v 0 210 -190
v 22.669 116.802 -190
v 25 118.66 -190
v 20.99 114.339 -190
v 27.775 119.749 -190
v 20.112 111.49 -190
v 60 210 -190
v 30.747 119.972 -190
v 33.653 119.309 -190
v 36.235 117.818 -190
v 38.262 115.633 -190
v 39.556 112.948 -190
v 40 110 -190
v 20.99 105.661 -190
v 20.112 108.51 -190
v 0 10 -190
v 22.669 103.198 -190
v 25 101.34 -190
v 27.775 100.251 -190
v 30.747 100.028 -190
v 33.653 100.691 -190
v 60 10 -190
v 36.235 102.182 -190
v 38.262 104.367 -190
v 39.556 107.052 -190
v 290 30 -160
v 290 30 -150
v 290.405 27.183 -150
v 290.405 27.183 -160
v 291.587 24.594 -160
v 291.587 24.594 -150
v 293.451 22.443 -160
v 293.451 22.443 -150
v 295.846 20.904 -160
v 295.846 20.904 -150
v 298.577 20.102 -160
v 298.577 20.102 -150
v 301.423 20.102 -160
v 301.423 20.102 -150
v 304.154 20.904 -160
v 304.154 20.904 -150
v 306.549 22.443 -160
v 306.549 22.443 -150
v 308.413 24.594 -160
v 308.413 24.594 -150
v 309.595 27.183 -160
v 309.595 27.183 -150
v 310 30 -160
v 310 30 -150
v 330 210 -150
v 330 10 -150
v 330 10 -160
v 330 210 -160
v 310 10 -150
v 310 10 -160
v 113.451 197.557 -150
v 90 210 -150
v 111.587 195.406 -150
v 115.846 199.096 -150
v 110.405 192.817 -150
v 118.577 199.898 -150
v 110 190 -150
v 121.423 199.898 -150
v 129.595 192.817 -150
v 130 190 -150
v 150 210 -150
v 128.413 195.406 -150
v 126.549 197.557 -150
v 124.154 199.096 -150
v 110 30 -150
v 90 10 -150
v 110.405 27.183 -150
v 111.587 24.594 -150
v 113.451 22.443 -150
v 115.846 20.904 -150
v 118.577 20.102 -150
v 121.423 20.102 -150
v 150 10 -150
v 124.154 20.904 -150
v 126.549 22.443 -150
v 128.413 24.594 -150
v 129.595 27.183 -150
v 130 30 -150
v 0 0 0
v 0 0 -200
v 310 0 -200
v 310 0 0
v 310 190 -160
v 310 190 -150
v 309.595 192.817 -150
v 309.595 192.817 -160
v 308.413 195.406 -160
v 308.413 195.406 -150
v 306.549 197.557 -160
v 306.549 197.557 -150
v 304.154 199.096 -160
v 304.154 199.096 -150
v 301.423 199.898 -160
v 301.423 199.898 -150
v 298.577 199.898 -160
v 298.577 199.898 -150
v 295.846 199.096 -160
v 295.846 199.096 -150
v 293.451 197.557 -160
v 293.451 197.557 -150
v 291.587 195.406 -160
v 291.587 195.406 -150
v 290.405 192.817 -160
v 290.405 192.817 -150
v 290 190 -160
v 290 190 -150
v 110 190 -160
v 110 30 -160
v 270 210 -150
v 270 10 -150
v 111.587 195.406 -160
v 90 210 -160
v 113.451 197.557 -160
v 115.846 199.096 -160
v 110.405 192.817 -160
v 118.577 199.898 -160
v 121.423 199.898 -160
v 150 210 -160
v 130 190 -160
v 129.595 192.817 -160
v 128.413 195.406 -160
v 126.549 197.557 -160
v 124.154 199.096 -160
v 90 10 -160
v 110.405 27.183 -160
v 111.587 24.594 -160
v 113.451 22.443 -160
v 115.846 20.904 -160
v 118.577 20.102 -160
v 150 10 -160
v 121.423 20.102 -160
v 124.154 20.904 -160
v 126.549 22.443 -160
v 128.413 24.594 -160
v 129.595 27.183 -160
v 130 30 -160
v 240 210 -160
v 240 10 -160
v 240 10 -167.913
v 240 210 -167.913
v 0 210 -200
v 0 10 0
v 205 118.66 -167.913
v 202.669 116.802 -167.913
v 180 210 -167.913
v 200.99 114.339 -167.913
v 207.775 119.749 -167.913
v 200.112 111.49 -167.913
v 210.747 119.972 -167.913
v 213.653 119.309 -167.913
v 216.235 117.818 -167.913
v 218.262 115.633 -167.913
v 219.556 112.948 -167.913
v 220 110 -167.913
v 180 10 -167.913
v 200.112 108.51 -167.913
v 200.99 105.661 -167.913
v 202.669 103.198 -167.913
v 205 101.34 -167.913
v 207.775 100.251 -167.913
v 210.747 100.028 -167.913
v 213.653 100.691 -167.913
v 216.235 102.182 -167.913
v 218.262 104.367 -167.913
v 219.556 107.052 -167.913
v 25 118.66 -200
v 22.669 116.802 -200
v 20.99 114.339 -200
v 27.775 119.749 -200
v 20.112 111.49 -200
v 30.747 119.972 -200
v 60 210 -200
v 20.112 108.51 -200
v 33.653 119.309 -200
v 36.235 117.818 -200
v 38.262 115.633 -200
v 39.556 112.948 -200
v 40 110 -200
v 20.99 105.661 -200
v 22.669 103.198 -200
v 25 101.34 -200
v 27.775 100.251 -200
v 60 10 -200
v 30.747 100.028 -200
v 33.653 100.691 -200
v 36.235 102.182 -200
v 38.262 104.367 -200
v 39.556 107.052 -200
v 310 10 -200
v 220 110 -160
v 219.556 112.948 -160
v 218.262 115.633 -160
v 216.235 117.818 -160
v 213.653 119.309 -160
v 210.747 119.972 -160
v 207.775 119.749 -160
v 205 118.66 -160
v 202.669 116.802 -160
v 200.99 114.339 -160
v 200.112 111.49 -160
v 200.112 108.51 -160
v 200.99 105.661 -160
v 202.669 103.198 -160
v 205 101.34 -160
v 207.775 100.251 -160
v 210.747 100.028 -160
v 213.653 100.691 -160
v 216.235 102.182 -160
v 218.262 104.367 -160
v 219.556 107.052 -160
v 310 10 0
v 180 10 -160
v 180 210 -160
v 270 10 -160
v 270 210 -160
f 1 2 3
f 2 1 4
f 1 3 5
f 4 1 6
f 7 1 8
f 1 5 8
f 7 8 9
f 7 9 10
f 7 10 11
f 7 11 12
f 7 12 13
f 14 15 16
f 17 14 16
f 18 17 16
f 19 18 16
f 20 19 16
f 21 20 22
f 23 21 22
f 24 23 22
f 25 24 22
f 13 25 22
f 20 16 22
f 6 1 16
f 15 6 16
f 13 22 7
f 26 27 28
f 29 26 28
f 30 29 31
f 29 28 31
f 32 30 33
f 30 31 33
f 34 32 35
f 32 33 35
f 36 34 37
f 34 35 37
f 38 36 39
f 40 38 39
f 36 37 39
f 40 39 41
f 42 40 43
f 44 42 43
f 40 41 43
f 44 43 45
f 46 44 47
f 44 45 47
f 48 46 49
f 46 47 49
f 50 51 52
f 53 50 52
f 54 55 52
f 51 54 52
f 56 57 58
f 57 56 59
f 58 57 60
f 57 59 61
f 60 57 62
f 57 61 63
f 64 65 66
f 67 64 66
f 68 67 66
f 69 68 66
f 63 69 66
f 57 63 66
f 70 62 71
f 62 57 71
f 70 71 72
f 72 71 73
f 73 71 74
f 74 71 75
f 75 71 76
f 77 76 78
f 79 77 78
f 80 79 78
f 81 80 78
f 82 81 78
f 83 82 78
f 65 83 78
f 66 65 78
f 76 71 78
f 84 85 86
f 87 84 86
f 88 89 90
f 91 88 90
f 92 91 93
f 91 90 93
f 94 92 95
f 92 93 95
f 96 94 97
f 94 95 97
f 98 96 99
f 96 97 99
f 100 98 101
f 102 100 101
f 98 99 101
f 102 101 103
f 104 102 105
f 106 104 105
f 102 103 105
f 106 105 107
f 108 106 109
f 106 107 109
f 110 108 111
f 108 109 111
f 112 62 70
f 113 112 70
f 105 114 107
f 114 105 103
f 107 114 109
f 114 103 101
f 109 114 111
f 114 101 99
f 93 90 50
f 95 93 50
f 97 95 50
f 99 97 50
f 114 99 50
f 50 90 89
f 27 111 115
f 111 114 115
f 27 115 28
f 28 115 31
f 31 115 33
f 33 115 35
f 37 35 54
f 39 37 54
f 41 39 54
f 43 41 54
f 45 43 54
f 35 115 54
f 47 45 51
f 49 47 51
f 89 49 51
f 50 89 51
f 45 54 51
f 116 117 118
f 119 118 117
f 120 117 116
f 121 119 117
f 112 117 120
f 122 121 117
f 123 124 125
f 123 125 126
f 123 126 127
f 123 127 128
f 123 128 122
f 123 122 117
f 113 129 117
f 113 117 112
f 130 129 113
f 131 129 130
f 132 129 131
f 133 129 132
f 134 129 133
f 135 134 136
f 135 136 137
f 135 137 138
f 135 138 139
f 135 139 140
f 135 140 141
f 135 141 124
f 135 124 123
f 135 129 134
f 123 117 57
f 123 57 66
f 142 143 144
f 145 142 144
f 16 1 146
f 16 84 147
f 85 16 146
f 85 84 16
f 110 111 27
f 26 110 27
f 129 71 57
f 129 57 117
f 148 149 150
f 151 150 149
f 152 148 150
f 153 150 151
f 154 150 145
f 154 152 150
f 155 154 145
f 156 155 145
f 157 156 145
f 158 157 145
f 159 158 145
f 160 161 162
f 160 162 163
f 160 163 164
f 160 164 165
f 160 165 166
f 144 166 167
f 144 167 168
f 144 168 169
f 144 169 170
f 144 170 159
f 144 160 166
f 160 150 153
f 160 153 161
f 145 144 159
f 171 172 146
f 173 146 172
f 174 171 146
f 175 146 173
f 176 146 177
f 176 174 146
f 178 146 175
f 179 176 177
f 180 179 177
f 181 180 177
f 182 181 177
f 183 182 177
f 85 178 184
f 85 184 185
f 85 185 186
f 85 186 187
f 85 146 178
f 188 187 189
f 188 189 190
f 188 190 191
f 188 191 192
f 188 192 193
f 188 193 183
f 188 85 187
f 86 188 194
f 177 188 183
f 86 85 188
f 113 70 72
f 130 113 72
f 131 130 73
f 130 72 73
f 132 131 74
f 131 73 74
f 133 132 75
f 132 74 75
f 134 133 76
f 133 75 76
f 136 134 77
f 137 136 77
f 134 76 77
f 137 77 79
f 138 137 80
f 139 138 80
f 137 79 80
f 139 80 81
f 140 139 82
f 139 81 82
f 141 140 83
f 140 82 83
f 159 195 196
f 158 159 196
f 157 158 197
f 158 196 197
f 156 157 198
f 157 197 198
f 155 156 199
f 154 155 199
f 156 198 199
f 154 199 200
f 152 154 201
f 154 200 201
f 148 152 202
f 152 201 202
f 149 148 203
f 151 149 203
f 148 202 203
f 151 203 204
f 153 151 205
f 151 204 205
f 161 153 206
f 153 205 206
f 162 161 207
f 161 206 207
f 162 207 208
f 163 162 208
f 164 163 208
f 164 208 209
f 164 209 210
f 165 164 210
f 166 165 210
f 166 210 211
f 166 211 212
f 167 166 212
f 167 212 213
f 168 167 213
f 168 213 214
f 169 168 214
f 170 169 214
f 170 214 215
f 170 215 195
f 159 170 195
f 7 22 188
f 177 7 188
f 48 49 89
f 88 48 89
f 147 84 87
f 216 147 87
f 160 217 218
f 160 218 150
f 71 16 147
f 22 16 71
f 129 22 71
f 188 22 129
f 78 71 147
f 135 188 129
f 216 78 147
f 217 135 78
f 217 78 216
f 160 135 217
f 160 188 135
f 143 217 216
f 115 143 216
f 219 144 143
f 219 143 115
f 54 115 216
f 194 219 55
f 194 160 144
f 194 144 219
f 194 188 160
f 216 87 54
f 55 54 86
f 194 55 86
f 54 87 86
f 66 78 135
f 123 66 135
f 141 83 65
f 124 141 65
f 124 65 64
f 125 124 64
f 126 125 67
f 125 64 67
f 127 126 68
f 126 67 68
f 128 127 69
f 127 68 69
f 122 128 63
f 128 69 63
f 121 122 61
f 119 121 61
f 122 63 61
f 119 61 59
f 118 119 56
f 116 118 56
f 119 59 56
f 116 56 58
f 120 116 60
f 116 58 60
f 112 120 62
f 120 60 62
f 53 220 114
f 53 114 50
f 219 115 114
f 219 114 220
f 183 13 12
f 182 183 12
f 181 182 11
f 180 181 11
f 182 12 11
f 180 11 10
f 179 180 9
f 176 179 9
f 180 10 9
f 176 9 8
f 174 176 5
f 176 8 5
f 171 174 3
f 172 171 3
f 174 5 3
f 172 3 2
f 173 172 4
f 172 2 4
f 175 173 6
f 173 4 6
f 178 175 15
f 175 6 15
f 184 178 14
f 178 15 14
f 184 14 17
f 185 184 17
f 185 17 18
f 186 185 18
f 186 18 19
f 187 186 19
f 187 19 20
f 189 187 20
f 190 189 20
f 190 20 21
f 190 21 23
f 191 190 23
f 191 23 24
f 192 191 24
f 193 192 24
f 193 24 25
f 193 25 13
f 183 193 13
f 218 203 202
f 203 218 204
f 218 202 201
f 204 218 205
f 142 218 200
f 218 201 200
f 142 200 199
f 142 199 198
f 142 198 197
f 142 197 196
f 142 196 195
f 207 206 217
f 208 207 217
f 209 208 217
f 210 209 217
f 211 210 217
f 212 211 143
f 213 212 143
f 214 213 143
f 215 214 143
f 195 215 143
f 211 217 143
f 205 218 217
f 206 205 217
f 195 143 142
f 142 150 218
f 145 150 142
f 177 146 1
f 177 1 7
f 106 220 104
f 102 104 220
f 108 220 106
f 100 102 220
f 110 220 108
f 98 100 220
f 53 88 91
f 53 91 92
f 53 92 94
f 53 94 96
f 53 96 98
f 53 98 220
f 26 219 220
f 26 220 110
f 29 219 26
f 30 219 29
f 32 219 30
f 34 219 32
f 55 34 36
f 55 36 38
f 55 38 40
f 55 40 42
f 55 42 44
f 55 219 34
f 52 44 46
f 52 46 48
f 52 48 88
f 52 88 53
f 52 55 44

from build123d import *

# Parameters (mm, degrees)
SKETCH1_W           = 310
SKETCH1_H           = 200
BOSS_EXTRUDE1_DEPTH = 10
SKETCH2_W           = 60
SKETCH2_H           = 10
SKETCH2_H_2         = 7.912912389
BOSS_EXTRUDE2_DEPTH = 200
SKETCH3_R           = 10
CUT_EXTRUDE1_DEPTH  = 200


with BuildPart() as part:
    # Sketch1 → Boss-Extrude1 (new body)
    with BuildSketch(Plane(origin=(0, 0, 0), x_dir=(1, 0, 0), z_dir=(0, 1, 0))):
        with Locations((155, 100)):
            Rectangle(SKETCH1_W, SKETCH1_H)
    extrude(amount=BOSS_EXTRUDE1_DEPTH)

    # Sketch2 → Boss-Extrude2 (add)
    with BuildSketch(Plane(origin=(0, 10, 0), x_dir=(1, 0, 0), z_dir=(0, 1, 0))):
        with Locations((30, 195)):
            Rectangle(SKETCH2_W, SKETCH2_H)
        with Locations((120, 155)):
            Rectangle(SKETCH2_W, SKETCH2_H)
        with Locations((300, 155)):
            Rectangle(SKETCH2_W, SKETCH2_H)
        with Locations((210, 163.956456194)):
            Rectangle(SKETCH2_W, SKETCH2_H_2)
    extrude(amount=BOSS_EXTRUDE2_DEPTH)

    # Sketch3 → Cut-Extrude1 (cut)
    with BuildSketch(Plane.XY.offset(-150)):
        with Locations((30, 110)):
            Circle(SKETCH3_R)
        with Locations((210, 110)):
            Circle(SKETCH3_R)
        with BuildLine():
            Line((110, 190), (110, 30))
            ThreePointArc((110, 30), (120, 20), (130, 30))
            Line((130, 30), (130, 190))
            ThreePointArc((130, 190), (120, 200), (110, 190))
        make_face()
        with BuildLine():
            Line((290, 190), (290, 30))
            ThreePointArc((290, 30), (300, 20), (310, 30))
            Line((310, 30), (310, 190))
            ThreePointArc((310, 190), (300, 200), (290, 190))
        make_face()
    extrude(amount=-CUT_EXTRUDE1_DEPTH, mode=Mode.SUBTRACT)


solid = part.part
